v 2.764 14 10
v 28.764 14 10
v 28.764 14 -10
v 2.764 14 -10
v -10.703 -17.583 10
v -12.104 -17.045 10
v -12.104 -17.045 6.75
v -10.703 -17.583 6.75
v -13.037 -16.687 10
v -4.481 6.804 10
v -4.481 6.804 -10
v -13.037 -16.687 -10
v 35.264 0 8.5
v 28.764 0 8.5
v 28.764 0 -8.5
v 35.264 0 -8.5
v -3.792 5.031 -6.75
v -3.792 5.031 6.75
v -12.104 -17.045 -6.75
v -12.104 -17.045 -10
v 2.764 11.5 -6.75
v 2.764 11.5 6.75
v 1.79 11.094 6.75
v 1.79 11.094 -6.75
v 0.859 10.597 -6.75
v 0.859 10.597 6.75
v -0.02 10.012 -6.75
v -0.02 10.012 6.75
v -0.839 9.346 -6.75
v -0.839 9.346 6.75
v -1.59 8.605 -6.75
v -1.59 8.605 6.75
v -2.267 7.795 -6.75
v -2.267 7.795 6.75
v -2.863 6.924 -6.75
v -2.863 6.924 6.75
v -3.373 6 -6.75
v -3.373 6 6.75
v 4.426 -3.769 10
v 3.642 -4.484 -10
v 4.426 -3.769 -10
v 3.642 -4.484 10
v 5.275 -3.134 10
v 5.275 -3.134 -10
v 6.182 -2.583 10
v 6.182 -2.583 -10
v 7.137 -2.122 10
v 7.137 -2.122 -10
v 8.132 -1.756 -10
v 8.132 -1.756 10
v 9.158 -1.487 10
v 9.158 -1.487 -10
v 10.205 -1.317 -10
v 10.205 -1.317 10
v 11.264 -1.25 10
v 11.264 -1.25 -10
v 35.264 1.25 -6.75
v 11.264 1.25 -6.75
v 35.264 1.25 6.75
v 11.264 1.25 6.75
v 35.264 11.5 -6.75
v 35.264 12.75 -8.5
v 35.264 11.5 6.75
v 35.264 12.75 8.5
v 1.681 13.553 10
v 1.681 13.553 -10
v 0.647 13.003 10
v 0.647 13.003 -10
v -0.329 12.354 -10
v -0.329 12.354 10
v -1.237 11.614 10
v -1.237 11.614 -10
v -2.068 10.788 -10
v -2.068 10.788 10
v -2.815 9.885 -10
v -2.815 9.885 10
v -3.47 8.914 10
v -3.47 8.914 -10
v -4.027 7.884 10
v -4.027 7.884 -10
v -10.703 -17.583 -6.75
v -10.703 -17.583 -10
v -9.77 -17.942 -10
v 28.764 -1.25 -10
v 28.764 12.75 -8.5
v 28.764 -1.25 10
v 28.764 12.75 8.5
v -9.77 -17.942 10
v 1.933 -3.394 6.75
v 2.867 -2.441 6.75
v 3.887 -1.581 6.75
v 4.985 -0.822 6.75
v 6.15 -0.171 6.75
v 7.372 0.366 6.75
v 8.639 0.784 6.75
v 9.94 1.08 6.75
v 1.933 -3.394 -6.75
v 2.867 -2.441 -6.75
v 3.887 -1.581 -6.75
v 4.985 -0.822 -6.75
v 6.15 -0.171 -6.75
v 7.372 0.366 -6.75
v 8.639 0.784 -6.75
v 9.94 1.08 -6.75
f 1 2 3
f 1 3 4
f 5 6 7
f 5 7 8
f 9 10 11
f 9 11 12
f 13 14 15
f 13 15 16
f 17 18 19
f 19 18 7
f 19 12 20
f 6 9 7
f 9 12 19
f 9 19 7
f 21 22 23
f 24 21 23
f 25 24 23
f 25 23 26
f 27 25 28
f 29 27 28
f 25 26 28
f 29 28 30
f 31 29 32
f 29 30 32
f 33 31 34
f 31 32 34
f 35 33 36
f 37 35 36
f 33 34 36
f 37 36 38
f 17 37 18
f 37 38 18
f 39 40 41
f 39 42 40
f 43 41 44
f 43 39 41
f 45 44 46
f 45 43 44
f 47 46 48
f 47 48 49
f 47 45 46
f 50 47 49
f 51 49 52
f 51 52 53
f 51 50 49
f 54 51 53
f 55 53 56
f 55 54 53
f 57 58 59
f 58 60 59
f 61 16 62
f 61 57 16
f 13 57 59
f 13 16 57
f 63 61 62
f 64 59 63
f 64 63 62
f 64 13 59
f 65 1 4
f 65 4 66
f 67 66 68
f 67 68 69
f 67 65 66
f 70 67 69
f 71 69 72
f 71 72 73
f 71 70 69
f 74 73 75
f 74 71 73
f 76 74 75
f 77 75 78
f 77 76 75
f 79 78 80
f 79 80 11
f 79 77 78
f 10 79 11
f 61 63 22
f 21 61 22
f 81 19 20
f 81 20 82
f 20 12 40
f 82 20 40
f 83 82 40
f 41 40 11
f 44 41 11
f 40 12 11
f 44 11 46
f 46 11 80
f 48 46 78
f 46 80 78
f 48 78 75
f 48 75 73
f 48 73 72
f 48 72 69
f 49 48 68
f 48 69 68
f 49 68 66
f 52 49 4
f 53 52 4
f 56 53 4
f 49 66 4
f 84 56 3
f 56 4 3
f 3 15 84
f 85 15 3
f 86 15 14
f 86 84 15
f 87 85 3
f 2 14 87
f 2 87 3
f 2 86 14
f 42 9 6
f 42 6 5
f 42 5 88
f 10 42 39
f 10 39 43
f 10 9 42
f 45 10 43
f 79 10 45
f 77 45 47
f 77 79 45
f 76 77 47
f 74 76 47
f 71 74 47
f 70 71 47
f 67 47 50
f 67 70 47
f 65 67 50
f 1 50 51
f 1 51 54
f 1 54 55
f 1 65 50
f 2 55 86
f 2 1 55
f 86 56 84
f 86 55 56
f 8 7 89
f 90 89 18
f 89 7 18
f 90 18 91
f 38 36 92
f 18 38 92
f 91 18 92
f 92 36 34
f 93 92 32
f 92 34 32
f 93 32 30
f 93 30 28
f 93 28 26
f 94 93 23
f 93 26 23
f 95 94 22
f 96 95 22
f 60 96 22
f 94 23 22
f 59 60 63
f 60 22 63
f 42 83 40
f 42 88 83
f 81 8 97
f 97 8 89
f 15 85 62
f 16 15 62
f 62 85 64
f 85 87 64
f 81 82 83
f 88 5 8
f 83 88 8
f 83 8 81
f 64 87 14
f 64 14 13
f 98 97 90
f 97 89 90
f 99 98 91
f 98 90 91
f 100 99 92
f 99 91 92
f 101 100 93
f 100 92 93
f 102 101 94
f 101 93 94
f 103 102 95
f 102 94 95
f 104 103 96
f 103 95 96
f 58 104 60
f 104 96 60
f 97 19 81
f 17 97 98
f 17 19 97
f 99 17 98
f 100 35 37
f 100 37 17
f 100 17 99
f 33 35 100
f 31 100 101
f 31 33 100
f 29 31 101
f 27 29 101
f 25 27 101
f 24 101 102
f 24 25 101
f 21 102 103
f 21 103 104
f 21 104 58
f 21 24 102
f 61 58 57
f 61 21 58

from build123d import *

# Parameters (mm, degrees)
F0_W     = 17.5
F0_H     = 1.25
F1_DEPTH = 10
F0_H_2   = 10.25
F2_DEPTH = 10
F0_W_2   = 6.5
F3_DEPTH = 8.5
F4_DEPTH = 6.75
F5_DEPTH = 6.75


# Not quite as in the source:
# - a feature names something its author has since deleted; it is built from what else it names


with BuildPart() as f1:
    # F0 (on Top) → F1 (new body, symmetric)
    with BuildSketch(Plane.XY):
        with Locations((20.0137786908, 13.375)):
            Rectangle(F0_W, F0_H)
        with Locations((20.0137786908, 12.125)):
            Rectangle(F0_W, F0_H)
        with BuildLine():
            Line((2.7637786908, 11.5), (11.2637786908, 11.5))
            Line((11.2637786908, 11.5), (11.2637786908, 12.75))
            Line((11.2637786908, 12.75), (11.2637786908, 14))
            Line((11.2637786908, 14), (2.7637786908, 14))
            ThreePointArc((2.7637786908, 14), (-1.6624935941, 11.2110263052), (-4.4814392939, 6.8037816159))
            Line((-4.4814392939, 6.8037816159), (-13.0372270502, -16.686609949))
            Line((-13.0372270502, -16.686609949), (-12.1037272591, -17.0451878901))
            Line((-12.1037272591, -17.0451878901), (-3.7917014922, 5.0309925083))
            ThreePointArc((-3.7917014922, 5.0309925083), (-1.2235822128, 8.9846027287), (2.7637786908, 11.5))
        make_face()
    extrude(amount=F1_DEPTH, both=True)



with BuildPart() as f1b:
    # F0 (on Top) → F1, piece 2 (new body, symmetric)
    with BuildSketch(Plane.XY):
        with Locations((20.0137786908, 0.625)):
            Rectangle(F0_W, F0_H)
        with Locations((20.0137786908, -0.625)):
            Rectangle(F0_W, F0_H)
        with BuildLine():
            Line((11.2637786908, -1.25), (11.2637786908, 0))
            Line((11.2637786908, 0), (11.2637786908, 1.25))
            ThreePointArc((11.2637786908, 1.25), (6.1499097664, -0.1712613654), (1.9326170674, -3.3940057761))
            Line((1.9326170674, -3.3940057761), (-10.7034775723, -17.5830548019))
            Line((-10.7034775723, -17.5830548019), (-9.7699777812, -17.9416327431))
            Line((-9.7699777812, -17.9416327431), (3.6421700758, -4.483761817))
            ThreePointArc((3.6421700758, -4.483761817), (7.1371242658, -2.1224581239), (11.2637786908, -1.25))
        make_face()
    extrude(amount=F1_DEPTH, both=True)


with BuildPart() as f1_1:
    add(f1.part)

    add(f1b.part)  # F2 merges F1b
    # F0 (on Top) → F2 (join, symmetric)
    with BuildSketch(Plane.XY):
        with Locations((20.0137786908, 6.375)):
            Rectangle(F0_W, F0_H_2)
        with BuildLine():
            ThreePointArc((1.9326170674, -3.3940057761), (6.1499097664, -0.1712613654), (11.2637786908, 1.25))
            Line((11.2637786908, 1.25), (11.2637786908, 11.5))
            Line((11.2637786908, 11.5), (2.7637786908, 11.5))
            ThreePointArc((2.7637786908, 11.5), (-1.2235822128, 8.9846027287), (-3.7917014922, 5.0309925083))
            Line((-3.7917014922, 5.0309925083), (-12.1037272591, -17.0451878901))
            Line((-12.1037272591, -17.0451878901), (-10.7034775723, -17.5830548019))
            Line((-10.7034775723, -17.5830548019), (1.9326170674, -3.3940057761))
        make_face()
    extrude(amount=F2_DEPTH, both=True)

    # F0 (on Top) → F3 (join, symmetric)
    with BuildSketch(Plane.XY):
        with Locations((32.0137786908, 12.125)):
            Rectangle(F0_W_2, F0_H)
        with Locations((32.0137786908, 6.375)):
            Rectangle(F0_W_2, F0_H_2)
        with Locations((32.0137786908, 0.625)):
            Rectangle(F0_W_2, F0_H)
    extrude(amount=F3_DEPTH, both=True)

    # F0 (on Top) → F4 (cut, symmetric)
    with BuildSketch(Plane.XY):
        with Locations((20.0137786908, 6.375)):
            Rectangle(F0_W, F0_H_2)
        with BuildLine():
            ThreePointArc((1.9326170674, -3.3940057761), (6.1499097664, -0.1712613654), (11.2637786908, 1.25))
            Line((11.2637786908, 1.25), (11.2637786908, 11.5))
            Line((11.2637786908, 11.5), (2.7637786908, 11.5))
            ThreePointArc((2.7637786908, 11.5), (-1.2235822128, 8.9846027287), (-3.7917014922, 5.0309925083))
            Line((-3.7917014922, 5.0309925083), (-12.1037272591, -17.0451878901))
            Line((-12.1037272591, -17.0451878901), (-10.7034775723, -17.5830548019))
            Line((-10.7034775723, -17.5830548019), (1.9326170674, -3.3940057761))
        make_face()
    extrude(amount=F4_DEPTH, both=True, mode=Mode.SUBTRACT)

    # F0 (on Top) → F5 (cut, symmetric)
    with BuildSketch(Plane.XY):
        with Locations((32.0137786908, 6.375)):
            Rectangle(F0_W_2, F0_H_2)
    extrude(amount=F5_DEPTH, both=True, mode=Mode.SUBTRACT)


solid = f1_1.part
